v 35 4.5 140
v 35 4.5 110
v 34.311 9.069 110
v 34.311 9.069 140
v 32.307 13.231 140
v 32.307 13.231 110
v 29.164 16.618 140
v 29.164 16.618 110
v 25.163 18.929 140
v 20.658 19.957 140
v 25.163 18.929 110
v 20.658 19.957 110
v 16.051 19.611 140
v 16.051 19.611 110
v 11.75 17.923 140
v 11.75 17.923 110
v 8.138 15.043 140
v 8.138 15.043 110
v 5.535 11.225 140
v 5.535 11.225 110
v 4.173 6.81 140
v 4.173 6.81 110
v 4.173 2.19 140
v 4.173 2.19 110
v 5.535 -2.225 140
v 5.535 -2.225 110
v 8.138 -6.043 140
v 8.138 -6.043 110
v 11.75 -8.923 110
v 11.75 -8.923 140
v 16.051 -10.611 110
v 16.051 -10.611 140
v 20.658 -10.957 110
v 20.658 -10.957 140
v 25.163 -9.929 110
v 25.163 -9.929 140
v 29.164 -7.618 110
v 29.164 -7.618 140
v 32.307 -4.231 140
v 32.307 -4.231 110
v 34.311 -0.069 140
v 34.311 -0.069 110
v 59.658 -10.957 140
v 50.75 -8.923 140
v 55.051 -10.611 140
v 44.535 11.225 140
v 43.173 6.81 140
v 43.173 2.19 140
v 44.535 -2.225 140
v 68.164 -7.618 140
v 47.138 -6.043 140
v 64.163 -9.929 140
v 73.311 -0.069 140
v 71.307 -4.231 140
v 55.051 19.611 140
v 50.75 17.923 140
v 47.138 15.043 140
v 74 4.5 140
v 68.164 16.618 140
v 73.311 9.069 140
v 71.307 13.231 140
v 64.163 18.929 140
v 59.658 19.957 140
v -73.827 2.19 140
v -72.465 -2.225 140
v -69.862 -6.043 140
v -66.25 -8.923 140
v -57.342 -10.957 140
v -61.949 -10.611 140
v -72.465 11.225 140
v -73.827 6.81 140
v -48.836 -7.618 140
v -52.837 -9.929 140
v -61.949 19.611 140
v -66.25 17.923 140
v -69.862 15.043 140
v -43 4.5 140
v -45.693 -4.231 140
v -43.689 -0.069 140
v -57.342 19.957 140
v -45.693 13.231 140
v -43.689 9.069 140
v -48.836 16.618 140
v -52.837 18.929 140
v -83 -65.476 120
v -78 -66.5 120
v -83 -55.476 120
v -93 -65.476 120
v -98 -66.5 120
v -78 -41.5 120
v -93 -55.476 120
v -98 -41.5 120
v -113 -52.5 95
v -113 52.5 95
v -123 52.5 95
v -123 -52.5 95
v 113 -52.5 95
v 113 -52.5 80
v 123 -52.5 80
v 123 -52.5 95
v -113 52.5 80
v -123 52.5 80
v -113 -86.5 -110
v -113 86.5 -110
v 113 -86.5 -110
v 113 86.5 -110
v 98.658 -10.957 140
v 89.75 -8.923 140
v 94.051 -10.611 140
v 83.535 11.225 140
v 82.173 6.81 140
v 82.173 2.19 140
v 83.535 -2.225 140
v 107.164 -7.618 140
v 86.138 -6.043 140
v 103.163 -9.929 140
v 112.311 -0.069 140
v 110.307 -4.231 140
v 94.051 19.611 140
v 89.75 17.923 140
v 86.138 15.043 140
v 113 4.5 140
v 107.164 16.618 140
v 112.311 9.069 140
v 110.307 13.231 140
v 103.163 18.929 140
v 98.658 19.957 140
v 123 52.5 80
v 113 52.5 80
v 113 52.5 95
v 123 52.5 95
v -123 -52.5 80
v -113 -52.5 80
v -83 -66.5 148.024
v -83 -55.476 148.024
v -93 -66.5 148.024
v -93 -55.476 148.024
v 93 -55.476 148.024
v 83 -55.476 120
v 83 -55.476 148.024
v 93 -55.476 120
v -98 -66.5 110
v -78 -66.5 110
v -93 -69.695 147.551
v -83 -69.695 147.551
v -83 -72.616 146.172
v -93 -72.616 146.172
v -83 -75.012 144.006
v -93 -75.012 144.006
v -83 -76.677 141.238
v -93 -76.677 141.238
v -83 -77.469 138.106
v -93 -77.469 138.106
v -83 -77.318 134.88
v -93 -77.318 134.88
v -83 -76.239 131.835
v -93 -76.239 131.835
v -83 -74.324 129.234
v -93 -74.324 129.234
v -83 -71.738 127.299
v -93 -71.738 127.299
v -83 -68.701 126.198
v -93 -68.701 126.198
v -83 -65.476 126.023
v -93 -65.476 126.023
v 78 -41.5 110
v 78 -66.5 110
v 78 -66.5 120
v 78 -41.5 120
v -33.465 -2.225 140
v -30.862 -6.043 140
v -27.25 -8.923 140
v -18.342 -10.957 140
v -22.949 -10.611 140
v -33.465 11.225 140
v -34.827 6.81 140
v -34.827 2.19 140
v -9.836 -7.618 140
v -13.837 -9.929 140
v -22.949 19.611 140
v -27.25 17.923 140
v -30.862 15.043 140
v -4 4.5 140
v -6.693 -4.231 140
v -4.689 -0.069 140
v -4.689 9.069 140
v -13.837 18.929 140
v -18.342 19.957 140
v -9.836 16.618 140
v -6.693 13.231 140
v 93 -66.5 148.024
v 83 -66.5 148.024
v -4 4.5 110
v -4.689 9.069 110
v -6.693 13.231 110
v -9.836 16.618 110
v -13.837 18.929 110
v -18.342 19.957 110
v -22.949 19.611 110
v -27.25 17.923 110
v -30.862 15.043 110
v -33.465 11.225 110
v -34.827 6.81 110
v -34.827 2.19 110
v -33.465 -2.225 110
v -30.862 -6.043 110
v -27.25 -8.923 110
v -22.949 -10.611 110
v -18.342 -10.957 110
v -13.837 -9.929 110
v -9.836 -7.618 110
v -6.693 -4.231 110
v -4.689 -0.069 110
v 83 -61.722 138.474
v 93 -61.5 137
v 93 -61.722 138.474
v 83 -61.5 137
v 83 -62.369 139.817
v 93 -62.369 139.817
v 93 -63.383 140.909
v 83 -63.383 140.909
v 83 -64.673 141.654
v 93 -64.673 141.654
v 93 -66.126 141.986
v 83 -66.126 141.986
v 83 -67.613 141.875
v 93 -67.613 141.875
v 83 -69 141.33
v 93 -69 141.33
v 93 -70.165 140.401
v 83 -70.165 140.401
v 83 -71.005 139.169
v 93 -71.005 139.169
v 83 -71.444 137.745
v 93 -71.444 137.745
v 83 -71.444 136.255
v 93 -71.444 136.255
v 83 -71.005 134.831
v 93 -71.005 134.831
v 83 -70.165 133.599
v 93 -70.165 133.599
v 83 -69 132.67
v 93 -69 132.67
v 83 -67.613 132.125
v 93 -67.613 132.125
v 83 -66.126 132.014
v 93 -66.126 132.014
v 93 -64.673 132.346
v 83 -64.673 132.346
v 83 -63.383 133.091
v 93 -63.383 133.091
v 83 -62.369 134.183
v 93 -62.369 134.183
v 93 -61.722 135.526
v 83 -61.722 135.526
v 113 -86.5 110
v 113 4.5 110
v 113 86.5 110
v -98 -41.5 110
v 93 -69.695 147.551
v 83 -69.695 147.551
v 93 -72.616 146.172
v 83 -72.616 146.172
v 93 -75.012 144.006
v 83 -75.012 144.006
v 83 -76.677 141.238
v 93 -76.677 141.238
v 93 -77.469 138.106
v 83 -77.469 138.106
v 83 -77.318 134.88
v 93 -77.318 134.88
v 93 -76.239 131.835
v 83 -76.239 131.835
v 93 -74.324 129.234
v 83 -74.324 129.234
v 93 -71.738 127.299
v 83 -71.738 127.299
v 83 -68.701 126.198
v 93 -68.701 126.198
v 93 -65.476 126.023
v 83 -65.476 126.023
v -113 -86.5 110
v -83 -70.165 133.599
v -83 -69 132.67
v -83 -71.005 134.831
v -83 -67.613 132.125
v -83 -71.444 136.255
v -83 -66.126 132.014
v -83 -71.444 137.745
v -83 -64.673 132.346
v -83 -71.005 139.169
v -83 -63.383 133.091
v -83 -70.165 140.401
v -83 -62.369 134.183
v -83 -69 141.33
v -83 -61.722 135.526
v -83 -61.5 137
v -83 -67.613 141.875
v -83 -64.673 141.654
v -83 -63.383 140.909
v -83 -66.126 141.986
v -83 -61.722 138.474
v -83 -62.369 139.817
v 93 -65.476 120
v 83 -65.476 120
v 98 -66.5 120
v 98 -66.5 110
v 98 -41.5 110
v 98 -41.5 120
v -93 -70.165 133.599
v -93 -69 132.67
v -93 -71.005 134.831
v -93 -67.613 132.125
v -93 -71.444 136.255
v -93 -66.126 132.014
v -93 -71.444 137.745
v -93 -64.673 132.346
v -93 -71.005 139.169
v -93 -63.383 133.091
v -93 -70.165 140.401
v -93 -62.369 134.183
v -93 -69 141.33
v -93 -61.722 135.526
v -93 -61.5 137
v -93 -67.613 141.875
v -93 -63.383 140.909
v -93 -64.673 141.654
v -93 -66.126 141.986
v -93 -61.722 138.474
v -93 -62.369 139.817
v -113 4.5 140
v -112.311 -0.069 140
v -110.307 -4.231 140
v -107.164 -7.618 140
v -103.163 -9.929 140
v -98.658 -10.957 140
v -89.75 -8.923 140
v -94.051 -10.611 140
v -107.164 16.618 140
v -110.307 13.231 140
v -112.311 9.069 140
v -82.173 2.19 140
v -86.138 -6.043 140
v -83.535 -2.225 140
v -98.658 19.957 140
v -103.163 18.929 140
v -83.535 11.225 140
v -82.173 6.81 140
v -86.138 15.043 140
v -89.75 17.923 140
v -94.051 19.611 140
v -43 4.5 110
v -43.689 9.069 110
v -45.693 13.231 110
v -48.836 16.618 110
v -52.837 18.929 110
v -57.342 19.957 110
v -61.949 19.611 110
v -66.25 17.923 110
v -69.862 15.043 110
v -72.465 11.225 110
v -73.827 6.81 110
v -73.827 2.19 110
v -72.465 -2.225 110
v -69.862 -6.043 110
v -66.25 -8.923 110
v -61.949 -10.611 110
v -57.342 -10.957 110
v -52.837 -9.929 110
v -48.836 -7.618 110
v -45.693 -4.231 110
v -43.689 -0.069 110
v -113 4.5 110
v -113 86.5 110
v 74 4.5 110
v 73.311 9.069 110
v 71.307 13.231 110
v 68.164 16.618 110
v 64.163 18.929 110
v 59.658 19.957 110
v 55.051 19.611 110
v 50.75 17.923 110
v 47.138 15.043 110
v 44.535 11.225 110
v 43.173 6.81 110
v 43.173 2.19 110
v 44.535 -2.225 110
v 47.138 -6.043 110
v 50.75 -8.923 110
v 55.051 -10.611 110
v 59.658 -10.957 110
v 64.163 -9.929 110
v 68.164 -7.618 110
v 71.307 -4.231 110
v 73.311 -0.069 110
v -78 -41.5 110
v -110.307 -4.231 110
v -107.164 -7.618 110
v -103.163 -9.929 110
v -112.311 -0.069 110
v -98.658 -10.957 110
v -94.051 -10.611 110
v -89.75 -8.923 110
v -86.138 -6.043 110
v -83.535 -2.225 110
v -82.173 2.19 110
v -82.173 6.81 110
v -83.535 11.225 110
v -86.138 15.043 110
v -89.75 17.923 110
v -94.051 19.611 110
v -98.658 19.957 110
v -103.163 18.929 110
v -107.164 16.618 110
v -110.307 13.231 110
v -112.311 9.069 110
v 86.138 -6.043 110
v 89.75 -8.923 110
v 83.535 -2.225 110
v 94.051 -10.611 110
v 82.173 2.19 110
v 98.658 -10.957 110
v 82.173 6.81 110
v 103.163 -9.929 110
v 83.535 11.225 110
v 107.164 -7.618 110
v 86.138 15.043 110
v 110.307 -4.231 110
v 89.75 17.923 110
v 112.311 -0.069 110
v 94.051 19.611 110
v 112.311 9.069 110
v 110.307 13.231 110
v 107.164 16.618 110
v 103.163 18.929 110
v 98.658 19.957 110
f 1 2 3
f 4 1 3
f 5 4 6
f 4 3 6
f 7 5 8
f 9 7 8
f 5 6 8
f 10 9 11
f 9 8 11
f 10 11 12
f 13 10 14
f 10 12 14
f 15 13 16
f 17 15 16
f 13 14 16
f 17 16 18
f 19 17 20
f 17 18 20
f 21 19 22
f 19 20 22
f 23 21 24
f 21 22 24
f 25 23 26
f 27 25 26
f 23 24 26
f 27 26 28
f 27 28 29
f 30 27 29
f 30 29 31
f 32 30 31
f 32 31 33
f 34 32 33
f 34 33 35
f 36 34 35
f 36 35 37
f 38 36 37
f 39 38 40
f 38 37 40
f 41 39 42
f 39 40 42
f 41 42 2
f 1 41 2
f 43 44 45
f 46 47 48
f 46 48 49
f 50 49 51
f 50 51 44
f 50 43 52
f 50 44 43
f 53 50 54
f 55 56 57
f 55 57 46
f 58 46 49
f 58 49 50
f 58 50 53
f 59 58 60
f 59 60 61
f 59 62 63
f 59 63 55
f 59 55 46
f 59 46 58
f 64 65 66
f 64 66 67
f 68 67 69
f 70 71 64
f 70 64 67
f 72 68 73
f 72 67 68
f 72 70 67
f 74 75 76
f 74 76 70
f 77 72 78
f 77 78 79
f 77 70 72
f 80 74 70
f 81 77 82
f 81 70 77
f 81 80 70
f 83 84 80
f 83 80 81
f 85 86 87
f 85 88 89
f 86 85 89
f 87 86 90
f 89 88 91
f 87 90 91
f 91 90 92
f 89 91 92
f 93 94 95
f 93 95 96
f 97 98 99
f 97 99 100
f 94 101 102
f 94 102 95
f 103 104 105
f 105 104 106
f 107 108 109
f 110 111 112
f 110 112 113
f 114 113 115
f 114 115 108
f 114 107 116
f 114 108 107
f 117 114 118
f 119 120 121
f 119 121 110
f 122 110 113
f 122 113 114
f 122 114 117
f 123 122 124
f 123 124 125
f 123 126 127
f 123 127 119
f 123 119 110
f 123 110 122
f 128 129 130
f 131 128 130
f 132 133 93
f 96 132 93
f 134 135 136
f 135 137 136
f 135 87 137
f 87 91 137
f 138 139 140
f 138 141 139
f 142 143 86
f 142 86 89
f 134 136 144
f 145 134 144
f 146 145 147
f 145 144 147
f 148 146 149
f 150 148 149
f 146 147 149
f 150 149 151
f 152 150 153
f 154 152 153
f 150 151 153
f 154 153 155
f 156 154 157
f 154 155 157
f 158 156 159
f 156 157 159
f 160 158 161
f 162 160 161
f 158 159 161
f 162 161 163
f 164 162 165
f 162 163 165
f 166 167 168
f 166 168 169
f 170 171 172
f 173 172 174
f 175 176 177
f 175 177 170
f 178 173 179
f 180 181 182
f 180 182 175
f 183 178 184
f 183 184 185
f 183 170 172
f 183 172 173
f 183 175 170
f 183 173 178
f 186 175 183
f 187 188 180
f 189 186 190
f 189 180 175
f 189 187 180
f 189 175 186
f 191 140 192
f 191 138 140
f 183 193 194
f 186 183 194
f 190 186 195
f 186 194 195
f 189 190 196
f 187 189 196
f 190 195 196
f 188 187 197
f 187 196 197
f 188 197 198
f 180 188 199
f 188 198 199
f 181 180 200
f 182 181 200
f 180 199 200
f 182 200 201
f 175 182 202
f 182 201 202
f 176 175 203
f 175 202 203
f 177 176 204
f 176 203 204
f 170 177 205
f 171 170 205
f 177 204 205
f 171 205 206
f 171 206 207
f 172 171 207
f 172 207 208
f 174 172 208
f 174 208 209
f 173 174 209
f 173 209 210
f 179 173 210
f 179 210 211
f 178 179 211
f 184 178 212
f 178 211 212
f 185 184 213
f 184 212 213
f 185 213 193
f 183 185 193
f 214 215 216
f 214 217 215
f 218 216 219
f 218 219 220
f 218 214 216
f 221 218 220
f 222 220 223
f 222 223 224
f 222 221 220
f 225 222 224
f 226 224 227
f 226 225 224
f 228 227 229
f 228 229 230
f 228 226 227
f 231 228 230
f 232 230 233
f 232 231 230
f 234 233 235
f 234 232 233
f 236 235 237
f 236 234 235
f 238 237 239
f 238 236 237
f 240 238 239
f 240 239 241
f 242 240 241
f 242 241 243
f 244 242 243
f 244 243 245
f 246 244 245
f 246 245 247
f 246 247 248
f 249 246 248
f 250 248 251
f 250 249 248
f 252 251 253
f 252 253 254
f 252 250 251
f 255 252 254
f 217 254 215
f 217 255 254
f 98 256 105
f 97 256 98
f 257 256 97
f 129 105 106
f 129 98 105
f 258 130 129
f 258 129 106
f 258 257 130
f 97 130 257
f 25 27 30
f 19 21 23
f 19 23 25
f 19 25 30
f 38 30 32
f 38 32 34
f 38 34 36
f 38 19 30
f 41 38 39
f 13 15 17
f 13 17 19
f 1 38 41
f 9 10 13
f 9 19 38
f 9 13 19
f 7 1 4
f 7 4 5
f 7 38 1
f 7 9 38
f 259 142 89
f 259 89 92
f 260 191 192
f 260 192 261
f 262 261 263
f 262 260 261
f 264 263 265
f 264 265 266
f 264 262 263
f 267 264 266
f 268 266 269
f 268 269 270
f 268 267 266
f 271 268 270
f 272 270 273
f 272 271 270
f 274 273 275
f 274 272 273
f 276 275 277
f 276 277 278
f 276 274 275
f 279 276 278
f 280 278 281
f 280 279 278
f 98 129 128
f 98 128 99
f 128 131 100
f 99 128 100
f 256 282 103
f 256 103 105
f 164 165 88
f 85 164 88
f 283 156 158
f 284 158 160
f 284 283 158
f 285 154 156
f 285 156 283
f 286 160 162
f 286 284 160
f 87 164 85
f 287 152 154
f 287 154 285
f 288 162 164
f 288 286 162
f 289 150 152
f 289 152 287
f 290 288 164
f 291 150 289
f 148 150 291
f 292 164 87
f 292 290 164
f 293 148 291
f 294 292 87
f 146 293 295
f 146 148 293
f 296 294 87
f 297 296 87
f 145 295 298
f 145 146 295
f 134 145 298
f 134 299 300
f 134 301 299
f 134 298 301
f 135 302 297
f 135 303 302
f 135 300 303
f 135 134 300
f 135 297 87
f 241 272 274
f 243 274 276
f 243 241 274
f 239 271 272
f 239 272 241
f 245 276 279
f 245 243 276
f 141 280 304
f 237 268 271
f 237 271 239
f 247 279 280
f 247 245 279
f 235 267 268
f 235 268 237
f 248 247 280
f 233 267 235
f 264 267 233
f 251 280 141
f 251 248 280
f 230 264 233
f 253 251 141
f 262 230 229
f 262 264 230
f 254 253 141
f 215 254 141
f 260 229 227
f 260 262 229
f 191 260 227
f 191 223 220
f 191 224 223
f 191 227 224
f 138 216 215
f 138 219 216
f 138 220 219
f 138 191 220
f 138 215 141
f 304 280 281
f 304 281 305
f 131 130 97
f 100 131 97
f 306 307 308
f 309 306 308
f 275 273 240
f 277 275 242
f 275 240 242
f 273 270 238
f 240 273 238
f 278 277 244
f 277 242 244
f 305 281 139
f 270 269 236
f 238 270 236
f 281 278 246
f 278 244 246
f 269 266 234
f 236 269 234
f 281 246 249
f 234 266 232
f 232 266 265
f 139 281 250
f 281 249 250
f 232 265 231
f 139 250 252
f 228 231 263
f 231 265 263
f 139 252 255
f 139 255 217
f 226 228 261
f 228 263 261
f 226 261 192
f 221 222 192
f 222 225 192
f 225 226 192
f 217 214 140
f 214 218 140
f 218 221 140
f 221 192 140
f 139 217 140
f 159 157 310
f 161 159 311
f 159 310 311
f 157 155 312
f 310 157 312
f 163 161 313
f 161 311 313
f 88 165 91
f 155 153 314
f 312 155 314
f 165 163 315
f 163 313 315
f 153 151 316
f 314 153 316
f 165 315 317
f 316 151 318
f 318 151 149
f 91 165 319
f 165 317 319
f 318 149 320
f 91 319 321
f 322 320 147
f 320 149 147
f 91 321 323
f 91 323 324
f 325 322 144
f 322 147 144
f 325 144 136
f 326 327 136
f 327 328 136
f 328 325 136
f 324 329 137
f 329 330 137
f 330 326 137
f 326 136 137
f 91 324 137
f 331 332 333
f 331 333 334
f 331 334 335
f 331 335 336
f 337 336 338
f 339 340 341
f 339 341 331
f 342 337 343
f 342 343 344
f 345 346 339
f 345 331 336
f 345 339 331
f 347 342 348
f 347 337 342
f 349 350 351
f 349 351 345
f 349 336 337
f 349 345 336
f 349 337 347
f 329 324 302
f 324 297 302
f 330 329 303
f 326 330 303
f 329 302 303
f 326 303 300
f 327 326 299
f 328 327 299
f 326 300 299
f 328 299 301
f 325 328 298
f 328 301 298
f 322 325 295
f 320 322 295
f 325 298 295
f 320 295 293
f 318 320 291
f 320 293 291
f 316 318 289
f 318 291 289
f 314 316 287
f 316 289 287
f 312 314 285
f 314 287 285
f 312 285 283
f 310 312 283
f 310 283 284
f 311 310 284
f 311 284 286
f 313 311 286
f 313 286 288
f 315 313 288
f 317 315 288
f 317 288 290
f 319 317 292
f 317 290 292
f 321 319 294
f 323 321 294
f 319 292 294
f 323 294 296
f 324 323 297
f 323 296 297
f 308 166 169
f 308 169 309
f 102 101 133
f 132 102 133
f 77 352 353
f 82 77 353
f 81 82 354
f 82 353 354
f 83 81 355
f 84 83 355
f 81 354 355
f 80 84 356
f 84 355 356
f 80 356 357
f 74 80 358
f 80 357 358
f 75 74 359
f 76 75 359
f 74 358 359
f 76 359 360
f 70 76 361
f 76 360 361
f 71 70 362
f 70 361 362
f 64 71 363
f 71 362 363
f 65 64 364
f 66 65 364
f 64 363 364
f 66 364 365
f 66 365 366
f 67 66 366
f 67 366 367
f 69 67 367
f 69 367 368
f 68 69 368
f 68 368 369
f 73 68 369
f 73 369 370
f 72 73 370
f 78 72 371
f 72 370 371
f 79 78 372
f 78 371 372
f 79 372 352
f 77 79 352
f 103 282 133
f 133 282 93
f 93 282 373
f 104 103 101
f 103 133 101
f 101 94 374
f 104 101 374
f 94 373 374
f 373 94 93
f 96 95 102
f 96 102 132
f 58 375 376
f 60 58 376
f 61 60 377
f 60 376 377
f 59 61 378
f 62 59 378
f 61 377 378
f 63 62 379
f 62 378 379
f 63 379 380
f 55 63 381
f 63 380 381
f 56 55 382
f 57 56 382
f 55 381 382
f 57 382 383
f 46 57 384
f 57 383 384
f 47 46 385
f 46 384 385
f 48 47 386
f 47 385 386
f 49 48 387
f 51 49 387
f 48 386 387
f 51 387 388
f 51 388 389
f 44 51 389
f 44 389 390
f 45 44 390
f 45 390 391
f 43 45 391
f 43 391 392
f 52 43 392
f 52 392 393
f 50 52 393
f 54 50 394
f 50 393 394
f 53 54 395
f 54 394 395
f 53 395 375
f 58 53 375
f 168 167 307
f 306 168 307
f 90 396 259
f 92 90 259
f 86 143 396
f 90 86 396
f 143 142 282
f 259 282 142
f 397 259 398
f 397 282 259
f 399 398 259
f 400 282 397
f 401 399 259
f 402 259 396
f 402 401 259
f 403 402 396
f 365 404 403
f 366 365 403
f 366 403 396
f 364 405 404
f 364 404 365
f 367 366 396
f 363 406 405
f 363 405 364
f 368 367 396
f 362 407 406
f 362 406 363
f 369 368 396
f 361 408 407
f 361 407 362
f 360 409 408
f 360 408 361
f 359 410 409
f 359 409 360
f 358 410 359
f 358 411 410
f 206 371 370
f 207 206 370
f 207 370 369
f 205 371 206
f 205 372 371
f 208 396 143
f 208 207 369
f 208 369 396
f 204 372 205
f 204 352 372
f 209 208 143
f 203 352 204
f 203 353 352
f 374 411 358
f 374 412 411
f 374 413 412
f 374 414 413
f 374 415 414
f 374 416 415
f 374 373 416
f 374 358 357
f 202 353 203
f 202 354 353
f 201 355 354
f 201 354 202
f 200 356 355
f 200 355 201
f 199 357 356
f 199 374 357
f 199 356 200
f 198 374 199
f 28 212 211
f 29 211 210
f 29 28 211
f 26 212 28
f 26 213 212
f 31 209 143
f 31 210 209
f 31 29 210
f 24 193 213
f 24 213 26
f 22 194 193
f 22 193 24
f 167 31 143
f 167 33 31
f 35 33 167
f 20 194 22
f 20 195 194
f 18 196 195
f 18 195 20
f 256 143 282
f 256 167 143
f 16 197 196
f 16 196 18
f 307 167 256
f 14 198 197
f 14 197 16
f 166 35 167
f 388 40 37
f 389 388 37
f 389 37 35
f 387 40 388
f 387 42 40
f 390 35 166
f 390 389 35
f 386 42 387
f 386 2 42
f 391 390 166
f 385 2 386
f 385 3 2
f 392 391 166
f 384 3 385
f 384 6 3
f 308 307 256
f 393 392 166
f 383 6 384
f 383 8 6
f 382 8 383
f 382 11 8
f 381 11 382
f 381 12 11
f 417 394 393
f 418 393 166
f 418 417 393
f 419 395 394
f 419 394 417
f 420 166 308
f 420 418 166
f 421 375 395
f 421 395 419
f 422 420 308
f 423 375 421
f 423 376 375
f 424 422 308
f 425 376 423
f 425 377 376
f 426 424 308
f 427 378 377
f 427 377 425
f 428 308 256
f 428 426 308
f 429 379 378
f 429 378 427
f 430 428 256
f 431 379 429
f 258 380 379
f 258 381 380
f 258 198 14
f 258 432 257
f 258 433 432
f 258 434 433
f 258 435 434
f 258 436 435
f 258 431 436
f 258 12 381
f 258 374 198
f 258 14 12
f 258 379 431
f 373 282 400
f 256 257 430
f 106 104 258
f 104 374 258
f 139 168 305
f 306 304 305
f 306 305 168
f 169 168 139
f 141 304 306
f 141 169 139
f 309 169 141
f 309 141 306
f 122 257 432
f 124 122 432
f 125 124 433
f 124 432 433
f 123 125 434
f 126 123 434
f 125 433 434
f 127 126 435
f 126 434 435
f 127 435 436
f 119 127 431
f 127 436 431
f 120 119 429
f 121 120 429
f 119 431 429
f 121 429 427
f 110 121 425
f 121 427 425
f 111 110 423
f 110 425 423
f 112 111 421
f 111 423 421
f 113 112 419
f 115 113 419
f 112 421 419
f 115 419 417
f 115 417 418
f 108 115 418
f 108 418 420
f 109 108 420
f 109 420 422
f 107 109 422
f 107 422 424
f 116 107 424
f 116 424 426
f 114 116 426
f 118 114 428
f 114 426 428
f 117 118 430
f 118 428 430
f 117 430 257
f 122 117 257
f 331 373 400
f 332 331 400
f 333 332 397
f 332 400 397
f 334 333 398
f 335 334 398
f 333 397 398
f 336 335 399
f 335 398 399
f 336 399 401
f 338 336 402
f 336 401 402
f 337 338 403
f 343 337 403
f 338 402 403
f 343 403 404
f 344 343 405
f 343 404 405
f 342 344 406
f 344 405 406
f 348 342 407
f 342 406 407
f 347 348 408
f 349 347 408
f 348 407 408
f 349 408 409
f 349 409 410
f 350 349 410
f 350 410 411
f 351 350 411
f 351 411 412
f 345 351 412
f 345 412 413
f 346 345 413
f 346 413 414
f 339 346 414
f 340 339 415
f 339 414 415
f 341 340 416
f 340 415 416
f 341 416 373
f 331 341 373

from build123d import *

# Parameters (mm, degrees)
F0_W      = 226
F0_H      = 173
F1_DEPTH  = 110
F2_W      = 105
F2_H      = 15
F3_DEPTH  = 10
F4_R      = 15.5
F5_DEPTH  = 30
F6_W      = 20
F6_H      = 25
F7_DEPTH  = 10
F10_R     = 5
F11_DEPTH = 5


# Not quite as in the source:
# - a pattern or mirror of a feature is missing from the dataset's text; its kind, count and spacing are read off the source's solid


with BuildPart() as f1:
    # F0 (on Top) → F1 (new body, symmetric)
    with BuildSketch(Plane.XY):
        Rectangle(F0_W, F0_H)
    extrude(amount=F1_DEPTH, both=True)

    # F2 (on face) → F3 (join)
    with BuildSketch(Plane(origin=(-113, 0, 0), x_dir=(0, -1, 0), z_dir=(-1, 0, 0))):
        with Locations((0, 87.5)):
            Rectangle(F2_W, F2_H)
    f3 = extrude(amount=F3_DEPTH)

    # F3_copies: F3 across plane
    add(f3.mirror(Plane(origin=(0, 0, 0), x_dir=(0, 0, 1), z_dir=(1, 0, 0))))

    # F4 (on face) → F5 (join)
    with BuildSketch(Plane.XY.offset(110)):
        with BuildLine():
            ThreePointArc((-82, 4.5), (-97.5000000043, 20), (-113, 4.4999999915))
            ThreePointArc((-113, 4.4999999915), (-97.4999999957, -11), (-82, 4.5))
        make_face()
        with Locations((-58.5, 4.5)):
            Circle(F4_R)
        with Locations((-19.5, 4.5)):
            Circle(F4_R)
        with Locations((19.5, 4.5)):
            Circle(F4_R)
        with Locations((58.5, 4.5)):
            Circle(F4_R)
        with Locations((97.5, 4.5)):
            Circle(F4_R)
    extrude(amount=F5_DEPTH)

    # F6 (on face) → F7 (join)
    with BuildSketch(Plane.XY.offset(110)):
        with Locations((88, -54)):
            Rectangle(F6_W, F6_H)
    f7 = extrude(amount=F7_DEPTH)

    # F7_copies: F7 across plane
    add(f7.mirror(Plane(origin=(0, 0, 0), x_dir=(0, 0, -1), z_dir=(-1, 0, 0))))

    # F10 (on plane+point) → F11 (join, symmetric)
    with BuildSketch(Plane.YZ.offset(88)):
        with BuildLine():
            Line((-55.4758111389, 148.0241888611), (-66.5, 148.0241888611))
            ThreePointArc((-66.5, 148.0241888611), (-77.5122627569, 136.4873509794), (-65.4758111389, 126.0234897521))
            Line((-65.4758111389, 126.0234897521), (-65.4758111389, 120))
            Line((-65.4758111389, 120), (-55.4758111389, 120))
            Line((-55.4758111389, 120), (-55.4758111389, 137))
            Line((-55.4758111389, 137), (-55.4758111389, 148.0241888611))
        make_face()
        with Locations((-66.5, 137)):
            Circle(F10_R, mode=Mode.SUBTRACT)
    f11 = extrude(amount=F11_DEPTH, both=True)

    # F11_copies: F11 across plane
    add(f11.mirror(Plane(origin=(0, 0, 0), x_dir=(0, 0, -1), z_dir=(-1, 0, 0))))


solid = f1.part
